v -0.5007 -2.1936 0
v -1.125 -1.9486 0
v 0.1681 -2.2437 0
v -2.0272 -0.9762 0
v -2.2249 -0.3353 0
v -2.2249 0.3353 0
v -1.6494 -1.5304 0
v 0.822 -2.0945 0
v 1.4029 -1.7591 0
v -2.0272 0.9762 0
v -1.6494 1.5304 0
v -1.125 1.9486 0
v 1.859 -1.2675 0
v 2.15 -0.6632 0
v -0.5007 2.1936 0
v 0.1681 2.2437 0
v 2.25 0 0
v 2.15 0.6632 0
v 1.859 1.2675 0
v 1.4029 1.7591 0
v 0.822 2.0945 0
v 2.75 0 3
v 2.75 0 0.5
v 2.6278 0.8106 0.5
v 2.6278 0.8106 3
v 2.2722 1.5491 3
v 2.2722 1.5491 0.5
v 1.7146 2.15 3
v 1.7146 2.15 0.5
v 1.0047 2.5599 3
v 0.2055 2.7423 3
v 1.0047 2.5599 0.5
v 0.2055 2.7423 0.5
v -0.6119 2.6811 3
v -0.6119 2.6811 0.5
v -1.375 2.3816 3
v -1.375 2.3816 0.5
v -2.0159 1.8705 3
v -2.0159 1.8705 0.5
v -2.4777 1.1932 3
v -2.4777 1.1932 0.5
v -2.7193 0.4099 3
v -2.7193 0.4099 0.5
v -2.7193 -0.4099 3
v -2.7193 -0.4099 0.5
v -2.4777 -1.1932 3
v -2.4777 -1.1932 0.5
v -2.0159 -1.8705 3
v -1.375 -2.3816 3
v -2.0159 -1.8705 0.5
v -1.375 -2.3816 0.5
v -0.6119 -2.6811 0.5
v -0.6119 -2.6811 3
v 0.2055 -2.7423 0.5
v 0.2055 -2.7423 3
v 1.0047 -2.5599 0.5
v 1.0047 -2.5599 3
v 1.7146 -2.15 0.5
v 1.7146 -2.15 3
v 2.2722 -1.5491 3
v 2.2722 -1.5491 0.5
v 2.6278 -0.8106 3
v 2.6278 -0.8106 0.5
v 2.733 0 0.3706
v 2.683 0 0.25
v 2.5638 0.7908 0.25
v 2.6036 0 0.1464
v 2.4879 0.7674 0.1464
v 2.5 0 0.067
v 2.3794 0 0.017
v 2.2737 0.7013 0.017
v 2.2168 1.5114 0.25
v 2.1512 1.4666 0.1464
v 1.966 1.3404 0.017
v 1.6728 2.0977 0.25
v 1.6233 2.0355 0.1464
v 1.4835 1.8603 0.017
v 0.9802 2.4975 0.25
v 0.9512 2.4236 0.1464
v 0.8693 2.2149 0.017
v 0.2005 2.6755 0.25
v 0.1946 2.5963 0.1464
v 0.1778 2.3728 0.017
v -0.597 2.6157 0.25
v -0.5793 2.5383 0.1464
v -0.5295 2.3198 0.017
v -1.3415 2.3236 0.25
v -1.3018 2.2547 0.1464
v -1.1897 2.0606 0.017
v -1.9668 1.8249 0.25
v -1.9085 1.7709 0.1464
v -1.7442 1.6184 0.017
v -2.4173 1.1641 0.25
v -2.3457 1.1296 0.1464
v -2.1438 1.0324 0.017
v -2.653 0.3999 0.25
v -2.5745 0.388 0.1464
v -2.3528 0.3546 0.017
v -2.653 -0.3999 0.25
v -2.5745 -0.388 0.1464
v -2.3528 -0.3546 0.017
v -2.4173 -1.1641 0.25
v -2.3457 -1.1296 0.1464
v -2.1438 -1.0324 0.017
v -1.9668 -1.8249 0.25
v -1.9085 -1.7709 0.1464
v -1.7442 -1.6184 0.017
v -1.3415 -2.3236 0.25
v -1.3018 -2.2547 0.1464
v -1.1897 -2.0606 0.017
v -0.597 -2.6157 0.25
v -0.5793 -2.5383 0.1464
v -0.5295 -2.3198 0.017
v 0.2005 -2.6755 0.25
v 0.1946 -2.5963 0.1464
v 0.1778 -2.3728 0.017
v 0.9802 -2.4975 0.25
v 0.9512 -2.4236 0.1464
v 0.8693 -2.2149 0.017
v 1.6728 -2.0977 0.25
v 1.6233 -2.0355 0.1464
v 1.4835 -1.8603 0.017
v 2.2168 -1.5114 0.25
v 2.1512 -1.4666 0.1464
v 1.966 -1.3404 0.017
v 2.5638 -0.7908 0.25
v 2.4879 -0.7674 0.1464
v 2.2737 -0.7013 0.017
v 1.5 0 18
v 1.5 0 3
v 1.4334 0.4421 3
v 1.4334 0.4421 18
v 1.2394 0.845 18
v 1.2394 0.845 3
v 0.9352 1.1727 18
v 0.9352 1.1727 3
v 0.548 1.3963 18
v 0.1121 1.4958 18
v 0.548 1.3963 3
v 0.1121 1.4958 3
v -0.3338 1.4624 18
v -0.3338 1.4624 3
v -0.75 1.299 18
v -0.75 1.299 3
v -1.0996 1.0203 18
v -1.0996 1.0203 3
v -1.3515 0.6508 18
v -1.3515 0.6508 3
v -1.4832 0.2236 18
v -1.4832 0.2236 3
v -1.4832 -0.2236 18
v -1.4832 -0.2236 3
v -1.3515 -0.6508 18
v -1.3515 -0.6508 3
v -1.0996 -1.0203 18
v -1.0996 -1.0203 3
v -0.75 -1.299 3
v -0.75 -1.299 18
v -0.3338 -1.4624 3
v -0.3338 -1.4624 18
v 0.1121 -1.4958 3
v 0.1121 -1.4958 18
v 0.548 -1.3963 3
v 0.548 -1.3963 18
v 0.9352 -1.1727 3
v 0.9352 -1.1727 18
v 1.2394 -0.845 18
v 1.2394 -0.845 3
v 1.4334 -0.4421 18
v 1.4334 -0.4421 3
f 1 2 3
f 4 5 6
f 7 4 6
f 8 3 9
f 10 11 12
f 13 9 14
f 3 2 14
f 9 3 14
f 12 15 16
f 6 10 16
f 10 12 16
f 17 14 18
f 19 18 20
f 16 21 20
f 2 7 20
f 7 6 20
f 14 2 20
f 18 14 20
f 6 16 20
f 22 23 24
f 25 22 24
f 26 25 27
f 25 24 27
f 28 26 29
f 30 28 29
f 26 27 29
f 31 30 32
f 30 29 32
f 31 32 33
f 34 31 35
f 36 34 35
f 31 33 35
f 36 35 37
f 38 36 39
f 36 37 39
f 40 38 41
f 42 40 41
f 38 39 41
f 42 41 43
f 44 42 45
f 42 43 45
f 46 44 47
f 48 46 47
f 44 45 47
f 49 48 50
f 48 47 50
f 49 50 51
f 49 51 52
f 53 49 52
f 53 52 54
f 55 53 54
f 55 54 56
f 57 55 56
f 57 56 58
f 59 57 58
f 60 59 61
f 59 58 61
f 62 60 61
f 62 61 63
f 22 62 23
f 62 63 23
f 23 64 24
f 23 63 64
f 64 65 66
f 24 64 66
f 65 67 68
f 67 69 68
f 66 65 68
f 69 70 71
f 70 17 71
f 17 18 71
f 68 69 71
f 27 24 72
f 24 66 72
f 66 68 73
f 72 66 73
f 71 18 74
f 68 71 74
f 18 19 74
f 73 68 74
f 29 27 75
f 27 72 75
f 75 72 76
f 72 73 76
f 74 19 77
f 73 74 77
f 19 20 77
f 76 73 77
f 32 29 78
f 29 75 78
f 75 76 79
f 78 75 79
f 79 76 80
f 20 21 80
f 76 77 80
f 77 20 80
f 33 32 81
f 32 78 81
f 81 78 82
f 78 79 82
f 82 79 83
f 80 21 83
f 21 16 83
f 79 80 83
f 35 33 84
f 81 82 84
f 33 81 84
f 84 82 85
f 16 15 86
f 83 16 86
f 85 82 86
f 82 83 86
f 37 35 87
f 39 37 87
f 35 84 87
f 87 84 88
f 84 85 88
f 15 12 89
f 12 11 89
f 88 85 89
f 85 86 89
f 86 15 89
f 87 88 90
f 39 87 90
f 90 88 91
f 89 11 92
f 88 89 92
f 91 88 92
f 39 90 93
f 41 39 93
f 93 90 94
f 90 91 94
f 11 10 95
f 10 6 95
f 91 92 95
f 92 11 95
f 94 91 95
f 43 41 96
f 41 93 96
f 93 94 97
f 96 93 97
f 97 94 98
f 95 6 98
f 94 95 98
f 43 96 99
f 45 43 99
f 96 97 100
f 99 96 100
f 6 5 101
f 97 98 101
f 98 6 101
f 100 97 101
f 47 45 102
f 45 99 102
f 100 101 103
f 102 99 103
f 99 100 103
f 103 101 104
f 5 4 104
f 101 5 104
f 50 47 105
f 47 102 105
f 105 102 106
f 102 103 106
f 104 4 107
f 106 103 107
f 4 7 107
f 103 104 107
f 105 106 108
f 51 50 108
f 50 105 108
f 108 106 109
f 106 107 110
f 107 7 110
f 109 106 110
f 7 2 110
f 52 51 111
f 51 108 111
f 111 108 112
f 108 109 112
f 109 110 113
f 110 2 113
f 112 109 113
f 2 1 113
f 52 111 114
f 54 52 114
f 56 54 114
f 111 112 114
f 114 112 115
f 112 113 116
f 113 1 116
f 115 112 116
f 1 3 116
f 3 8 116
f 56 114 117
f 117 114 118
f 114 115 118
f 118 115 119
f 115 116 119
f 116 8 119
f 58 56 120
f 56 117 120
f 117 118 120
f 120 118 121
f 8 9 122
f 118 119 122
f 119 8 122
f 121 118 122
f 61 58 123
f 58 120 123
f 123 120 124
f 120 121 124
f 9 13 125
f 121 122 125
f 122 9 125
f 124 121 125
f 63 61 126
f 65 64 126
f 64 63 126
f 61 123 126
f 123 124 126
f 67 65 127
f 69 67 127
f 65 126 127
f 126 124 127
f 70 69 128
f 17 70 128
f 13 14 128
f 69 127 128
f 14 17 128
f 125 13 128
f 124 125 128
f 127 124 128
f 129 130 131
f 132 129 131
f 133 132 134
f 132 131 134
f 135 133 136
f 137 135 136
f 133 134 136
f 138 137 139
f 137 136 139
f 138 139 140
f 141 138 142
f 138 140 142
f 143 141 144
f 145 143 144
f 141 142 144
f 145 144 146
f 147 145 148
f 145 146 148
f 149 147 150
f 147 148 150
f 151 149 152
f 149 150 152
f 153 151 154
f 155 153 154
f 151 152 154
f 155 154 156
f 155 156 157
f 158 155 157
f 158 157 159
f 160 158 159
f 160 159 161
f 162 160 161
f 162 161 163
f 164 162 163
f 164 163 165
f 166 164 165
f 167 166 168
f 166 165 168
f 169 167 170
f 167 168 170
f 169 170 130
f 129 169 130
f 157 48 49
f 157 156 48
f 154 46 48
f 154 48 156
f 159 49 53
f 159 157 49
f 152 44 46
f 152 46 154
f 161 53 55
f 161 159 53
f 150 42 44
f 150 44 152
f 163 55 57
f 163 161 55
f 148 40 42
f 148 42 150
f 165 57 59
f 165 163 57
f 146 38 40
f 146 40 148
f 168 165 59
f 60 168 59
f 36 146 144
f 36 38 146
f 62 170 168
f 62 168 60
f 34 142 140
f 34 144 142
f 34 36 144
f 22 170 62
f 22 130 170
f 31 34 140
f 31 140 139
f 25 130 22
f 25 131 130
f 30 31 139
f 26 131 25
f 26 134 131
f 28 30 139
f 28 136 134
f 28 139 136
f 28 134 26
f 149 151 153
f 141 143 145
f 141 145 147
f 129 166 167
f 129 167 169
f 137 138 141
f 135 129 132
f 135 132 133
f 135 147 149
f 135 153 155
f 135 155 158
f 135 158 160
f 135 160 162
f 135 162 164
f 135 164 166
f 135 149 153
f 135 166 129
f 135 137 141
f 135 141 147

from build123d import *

# Parameters (mm, degrees)
SKETCH_2_R      = 2.75
EXTRUDE_1_DEPTH = 3
SKETCH_3_R      = 1.5
EXTRUDE_2_DEPTH = 15
FILLET_1_R      = 0.5


with BuildPart() as part:
    # ｽｹｯﾁ2 → ﾎﾞｽ - 押し出し1 (new body)
    with BuildSketch(Plane.XY):
        Circle(SKETCH_2_R)
    extrude(amount=EXTRUDE_1_DEPTH)

    # ｽｹｯﾁ3 → ﾎﾞｽ - 押し出し2 (add)
    with BuildSketch(Plane.XY.offset(3)):
        Circle(SKETCH_3_R)
    extrude(amount=EXTRUDE_2_DEPTH)

    # ﾌｨﾚｯﾄ1
    fillet_1_edges = [part.edges().sort_by_distance(p)[0] for p in [
        (-2.75, 0, 0),
    ]]
    fillet(fillet_1_edges, radius=FILLET_1_R)


solid = part.part
